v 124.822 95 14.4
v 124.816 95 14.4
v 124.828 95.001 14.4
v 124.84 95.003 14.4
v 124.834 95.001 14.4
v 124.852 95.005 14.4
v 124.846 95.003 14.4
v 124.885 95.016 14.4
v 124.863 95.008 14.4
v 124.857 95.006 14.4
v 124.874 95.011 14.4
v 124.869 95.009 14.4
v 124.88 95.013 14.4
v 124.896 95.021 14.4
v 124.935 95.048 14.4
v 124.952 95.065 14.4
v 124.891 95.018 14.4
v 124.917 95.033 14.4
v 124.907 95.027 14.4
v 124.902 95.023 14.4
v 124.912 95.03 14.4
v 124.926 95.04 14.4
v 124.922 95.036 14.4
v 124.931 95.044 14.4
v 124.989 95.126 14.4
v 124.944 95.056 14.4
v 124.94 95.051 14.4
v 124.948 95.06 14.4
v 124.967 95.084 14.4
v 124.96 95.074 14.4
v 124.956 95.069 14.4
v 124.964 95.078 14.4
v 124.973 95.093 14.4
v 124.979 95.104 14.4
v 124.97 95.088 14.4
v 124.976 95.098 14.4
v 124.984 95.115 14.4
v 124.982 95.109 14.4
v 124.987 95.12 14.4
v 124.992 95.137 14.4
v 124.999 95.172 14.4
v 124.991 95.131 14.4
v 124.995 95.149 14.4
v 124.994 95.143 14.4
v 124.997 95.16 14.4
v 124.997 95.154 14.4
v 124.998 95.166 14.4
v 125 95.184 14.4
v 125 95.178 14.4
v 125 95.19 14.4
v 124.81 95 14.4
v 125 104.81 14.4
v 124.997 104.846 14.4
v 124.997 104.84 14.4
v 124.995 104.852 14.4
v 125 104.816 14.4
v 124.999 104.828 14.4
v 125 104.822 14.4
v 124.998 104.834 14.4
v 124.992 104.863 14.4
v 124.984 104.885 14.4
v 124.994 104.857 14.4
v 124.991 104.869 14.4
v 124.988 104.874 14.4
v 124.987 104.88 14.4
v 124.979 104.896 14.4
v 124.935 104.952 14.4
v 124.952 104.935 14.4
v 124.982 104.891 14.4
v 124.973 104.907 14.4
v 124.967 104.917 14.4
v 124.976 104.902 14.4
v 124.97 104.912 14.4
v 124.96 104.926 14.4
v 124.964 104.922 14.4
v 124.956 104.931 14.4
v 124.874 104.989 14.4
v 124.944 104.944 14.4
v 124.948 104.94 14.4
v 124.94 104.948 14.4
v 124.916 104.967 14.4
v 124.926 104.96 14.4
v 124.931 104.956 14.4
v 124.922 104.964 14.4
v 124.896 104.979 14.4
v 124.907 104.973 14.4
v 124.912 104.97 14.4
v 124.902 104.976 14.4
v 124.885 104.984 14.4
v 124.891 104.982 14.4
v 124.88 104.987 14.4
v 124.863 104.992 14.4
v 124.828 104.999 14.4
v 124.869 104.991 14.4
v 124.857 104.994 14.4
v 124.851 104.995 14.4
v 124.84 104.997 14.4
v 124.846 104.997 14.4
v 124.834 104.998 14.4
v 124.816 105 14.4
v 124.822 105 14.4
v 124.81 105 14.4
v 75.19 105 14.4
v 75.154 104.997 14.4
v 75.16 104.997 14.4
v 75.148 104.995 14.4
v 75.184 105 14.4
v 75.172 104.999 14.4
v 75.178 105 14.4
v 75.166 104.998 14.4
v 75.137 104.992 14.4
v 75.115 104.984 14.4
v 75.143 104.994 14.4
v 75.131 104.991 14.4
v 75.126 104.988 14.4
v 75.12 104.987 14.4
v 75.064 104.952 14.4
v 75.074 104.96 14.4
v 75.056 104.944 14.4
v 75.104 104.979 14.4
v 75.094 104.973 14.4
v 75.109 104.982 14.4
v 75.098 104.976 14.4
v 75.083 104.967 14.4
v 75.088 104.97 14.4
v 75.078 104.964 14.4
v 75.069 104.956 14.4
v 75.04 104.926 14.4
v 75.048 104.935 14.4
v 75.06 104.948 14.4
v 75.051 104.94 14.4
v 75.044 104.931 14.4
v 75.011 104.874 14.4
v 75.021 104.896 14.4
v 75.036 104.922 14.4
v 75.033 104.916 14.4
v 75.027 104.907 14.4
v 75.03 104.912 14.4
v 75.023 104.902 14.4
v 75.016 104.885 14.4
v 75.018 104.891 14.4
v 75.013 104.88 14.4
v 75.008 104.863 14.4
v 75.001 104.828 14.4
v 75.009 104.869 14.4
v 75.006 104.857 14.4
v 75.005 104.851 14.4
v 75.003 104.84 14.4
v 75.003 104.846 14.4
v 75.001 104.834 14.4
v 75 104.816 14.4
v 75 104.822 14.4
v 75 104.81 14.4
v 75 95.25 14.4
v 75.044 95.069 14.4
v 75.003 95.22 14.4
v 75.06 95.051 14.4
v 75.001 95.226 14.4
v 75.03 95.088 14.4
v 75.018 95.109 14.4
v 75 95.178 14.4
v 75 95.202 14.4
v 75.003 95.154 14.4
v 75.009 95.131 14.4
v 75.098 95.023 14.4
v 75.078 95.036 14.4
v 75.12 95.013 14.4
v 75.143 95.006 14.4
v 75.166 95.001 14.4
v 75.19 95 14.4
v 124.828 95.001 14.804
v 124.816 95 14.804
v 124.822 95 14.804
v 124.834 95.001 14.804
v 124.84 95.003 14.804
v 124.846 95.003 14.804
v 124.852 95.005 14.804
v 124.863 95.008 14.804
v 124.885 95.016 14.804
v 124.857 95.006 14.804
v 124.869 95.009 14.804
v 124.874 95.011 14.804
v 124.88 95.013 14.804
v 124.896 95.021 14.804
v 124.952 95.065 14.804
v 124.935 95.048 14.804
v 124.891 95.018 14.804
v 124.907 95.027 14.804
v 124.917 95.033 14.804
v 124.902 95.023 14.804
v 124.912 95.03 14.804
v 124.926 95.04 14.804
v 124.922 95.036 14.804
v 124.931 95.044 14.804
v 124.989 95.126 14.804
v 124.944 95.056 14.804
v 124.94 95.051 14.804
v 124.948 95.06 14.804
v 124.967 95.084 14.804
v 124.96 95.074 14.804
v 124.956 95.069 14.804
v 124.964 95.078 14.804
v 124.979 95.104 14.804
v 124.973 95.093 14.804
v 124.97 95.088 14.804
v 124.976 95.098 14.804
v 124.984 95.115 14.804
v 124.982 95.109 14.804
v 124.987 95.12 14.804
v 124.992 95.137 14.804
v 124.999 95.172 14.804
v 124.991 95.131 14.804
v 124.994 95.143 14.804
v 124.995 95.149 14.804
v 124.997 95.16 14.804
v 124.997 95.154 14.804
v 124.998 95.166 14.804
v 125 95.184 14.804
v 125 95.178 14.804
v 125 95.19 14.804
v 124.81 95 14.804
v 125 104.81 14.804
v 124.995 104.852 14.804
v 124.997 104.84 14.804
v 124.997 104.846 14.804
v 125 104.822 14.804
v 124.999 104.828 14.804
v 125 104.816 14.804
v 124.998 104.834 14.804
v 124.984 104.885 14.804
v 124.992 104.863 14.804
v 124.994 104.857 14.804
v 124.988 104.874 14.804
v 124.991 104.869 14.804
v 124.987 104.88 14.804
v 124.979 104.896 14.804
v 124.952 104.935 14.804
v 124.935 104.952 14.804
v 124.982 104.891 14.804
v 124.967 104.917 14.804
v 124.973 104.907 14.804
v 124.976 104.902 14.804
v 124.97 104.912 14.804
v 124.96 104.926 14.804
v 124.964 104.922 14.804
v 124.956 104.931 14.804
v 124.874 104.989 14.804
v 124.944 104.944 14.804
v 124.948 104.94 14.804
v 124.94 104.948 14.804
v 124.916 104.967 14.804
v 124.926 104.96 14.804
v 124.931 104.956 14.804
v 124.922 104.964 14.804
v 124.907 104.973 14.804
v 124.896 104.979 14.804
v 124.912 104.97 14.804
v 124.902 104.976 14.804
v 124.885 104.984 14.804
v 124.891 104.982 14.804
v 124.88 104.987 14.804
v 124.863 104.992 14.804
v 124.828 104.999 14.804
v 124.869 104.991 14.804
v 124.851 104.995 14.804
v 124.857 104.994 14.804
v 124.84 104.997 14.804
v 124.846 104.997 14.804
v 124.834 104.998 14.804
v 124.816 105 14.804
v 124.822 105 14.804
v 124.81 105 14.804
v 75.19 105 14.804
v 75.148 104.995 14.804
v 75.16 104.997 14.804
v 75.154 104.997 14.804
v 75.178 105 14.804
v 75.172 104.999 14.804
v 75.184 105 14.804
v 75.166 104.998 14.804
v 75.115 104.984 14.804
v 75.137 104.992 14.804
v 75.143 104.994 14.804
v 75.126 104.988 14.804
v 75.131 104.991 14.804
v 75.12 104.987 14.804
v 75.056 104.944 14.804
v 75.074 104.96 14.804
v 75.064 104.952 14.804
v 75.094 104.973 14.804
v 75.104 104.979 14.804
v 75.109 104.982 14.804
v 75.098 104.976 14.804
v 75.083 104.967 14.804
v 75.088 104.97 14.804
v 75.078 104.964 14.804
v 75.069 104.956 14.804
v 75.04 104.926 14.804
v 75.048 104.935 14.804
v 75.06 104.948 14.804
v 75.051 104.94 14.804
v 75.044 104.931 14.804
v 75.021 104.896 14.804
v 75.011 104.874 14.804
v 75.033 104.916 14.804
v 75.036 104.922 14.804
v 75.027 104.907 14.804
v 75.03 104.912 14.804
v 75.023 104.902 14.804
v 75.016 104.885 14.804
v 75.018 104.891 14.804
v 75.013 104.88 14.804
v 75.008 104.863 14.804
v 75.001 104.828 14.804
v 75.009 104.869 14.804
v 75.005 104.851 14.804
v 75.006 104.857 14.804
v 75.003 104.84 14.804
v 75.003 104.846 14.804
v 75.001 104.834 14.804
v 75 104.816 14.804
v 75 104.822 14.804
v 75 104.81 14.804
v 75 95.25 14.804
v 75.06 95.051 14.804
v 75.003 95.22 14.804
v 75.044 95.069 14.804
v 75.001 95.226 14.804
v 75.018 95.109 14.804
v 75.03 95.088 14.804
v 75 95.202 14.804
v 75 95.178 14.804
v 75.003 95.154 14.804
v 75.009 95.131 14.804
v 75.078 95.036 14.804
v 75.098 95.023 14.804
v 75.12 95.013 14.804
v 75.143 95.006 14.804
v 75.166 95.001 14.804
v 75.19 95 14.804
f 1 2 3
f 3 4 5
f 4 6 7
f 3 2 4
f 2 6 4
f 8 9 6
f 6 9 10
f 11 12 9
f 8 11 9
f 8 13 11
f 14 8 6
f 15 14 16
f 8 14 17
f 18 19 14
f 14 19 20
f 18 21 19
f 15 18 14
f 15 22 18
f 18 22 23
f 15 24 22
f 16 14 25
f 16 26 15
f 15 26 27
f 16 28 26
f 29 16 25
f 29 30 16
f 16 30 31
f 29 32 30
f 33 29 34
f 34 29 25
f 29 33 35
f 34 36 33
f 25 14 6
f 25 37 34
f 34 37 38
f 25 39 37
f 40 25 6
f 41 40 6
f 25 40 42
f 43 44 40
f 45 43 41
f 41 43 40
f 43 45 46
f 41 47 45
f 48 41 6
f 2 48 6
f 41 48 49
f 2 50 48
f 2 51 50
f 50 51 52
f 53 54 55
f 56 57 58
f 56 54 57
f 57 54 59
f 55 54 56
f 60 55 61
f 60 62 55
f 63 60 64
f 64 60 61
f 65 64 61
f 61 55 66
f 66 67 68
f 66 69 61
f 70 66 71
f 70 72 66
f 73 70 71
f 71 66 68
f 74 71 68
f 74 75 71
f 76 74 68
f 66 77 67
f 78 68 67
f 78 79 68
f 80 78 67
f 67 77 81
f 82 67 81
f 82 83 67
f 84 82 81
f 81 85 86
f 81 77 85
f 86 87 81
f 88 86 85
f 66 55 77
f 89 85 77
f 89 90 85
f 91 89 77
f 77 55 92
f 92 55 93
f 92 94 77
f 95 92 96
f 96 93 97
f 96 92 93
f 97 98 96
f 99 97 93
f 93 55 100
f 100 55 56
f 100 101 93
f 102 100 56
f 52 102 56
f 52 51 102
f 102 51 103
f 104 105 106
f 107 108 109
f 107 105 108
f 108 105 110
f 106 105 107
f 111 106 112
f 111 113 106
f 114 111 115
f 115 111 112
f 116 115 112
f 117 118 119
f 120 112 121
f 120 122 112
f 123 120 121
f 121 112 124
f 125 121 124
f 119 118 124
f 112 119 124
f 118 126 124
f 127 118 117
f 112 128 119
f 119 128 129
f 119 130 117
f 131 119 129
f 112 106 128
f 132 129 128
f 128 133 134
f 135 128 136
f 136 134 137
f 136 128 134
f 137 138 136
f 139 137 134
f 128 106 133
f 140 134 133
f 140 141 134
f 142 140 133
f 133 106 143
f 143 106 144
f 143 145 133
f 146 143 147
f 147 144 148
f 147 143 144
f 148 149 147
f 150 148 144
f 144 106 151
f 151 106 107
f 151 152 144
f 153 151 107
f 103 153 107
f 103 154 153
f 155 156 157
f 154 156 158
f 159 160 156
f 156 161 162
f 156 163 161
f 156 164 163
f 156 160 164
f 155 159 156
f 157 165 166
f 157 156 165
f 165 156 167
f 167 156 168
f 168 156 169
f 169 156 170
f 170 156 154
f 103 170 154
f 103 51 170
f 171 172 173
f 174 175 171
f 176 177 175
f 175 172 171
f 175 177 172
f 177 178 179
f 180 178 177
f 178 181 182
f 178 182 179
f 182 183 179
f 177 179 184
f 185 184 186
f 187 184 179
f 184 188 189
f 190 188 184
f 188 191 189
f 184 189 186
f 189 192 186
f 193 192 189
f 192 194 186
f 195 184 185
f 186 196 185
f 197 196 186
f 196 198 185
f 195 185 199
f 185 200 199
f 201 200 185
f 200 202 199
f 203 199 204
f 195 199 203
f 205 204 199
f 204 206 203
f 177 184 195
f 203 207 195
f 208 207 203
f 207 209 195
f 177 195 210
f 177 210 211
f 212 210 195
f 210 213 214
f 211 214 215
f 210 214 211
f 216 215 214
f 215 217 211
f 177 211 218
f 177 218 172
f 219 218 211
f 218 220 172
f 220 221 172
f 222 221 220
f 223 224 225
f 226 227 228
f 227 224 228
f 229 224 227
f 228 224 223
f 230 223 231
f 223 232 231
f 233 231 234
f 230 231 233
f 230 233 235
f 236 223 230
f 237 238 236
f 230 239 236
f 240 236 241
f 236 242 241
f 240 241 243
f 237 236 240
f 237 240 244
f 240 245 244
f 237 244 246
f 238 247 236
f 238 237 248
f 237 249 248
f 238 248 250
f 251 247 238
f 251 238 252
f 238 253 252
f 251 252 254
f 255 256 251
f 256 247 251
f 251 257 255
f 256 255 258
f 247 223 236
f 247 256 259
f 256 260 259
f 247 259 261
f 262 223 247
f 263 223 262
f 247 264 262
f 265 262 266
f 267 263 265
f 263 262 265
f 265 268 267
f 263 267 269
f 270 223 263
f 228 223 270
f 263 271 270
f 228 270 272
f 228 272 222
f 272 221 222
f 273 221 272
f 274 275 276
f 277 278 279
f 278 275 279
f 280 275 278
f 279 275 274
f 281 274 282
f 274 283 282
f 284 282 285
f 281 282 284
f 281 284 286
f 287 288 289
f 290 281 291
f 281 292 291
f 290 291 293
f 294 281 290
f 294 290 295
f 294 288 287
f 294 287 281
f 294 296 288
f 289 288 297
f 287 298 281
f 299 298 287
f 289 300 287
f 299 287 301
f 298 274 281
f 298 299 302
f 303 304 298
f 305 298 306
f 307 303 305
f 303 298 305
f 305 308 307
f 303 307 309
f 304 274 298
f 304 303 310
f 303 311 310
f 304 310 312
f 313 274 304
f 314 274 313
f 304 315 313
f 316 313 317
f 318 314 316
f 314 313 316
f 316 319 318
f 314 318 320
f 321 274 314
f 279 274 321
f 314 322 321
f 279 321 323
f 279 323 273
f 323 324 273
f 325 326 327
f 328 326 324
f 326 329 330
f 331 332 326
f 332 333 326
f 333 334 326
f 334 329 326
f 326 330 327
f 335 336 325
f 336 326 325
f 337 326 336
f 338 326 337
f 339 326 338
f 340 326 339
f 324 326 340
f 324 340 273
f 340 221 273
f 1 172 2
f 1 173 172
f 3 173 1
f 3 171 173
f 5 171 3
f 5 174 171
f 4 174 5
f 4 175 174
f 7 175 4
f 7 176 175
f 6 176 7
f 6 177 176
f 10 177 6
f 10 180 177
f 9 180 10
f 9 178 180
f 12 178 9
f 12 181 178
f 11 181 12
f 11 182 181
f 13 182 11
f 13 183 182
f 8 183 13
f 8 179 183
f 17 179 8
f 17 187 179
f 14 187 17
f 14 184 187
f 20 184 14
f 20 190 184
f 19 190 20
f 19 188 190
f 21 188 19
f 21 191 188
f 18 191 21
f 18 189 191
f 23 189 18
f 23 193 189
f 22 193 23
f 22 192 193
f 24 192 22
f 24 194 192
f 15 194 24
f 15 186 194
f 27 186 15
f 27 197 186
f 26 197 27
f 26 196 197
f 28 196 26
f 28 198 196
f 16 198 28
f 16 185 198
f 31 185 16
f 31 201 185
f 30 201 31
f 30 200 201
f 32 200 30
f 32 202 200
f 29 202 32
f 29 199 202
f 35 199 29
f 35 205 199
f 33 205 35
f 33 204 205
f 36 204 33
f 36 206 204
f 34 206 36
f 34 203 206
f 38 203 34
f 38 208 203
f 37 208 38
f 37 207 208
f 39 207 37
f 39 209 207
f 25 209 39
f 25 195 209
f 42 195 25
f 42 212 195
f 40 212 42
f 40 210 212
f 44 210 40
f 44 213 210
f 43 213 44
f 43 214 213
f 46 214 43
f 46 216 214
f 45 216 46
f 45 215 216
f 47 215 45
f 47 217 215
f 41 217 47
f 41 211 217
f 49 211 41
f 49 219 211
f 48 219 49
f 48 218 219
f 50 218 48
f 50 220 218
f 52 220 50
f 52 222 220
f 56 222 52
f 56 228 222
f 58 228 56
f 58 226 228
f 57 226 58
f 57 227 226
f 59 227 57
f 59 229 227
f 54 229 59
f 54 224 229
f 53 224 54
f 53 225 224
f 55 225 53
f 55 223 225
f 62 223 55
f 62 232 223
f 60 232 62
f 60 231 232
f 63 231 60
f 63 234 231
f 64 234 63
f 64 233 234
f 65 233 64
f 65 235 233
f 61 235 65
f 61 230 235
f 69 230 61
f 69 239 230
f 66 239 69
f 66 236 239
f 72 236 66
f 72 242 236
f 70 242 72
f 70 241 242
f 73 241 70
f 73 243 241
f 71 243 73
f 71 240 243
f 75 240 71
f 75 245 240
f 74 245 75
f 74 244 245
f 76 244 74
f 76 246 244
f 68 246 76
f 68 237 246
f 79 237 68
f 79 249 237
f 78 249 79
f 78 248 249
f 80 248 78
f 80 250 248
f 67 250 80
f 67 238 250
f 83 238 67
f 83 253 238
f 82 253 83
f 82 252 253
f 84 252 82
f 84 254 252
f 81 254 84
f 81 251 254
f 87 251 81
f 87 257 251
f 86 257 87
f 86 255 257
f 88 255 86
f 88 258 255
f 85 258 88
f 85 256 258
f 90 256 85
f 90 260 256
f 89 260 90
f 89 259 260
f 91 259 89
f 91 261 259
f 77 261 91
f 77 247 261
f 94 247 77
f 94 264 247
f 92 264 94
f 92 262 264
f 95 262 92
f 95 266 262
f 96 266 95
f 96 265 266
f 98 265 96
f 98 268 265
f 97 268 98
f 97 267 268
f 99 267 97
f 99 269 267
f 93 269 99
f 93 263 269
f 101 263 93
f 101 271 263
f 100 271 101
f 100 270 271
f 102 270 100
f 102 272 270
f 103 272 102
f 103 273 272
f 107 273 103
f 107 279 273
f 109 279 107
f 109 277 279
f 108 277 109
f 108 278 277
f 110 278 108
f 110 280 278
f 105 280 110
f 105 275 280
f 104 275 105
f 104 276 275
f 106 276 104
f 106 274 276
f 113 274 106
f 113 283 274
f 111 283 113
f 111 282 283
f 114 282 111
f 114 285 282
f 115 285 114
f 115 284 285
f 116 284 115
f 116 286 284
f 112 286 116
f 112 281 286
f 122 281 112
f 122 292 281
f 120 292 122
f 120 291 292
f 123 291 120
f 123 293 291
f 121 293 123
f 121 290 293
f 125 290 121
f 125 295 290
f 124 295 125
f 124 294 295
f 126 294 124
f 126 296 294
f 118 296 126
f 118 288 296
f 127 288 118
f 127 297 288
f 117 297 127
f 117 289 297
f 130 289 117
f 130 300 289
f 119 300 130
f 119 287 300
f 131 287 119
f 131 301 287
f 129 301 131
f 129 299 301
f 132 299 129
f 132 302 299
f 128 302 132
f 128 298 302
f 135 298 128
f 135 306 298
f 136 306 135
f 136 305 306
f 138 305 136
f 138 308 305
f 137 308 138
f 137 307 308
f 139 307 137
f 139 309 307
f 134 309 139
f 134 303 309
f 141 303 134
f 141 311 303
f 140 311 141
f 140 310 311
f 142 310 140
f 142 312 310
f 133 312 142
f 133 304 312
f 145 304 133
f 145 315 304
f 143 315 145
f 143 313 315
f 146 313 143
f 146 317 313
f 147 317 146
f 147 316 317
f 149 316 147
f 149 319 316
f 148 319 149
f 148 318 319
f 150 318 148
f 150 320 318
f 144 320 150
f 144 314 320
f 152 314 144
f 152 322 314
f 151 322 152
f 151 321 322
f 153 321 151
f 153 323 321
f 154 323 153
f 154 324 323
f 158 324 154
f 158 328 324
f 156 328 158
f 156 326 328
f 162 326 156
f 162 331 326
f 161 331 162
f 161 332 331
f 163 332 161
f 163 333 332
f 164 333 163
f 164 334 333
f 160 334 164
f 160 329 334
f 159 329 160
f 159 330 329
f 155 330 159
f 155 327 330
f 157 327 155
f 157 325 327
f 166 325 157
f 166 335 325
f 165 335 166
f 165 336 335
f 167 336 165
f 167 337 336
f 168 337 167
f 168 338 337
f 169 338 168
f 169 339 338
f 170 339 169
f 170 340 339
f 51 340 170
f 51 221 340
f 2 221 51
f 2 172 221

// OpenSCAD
module drawBasicShape(x1, y1, x2, y2, width)
{
	length = sqrt((x1-x2)*(x1-x2) + (y1-y2)*(y1-y2));
	if (width!=0.0) {
		square(size = [width, length], center = false);
		translate([width/2.0, 0, 0]) circle(d=width);
		translate([width/2.0, length, 0]) circle(d=width);
	}
}

module translateAndRotate(x1, y1, x2, y2, width)
{
	if (width != 0.0) {
		angle = atan((y2-y1)/(x2-x1)) +270;
		if (x2>=x1) {
			translate([x1, y1, 0.0]) rotate([0.0, 0.0, angle]) translate([-width/2.0, 0.0, 0.0]) scale([1.0, 1.0, 1.0]) drawBasicShape(x1, y1, x2, y2, width);
		}
		else {
			translate([x1, y1, 0.0]) rotate([0.0, 0.0, angle+180]) translate([-width/2.0, 0.0, 0.0]) scale([1.0, 1.0, 1.0]) drawBasicShape(x1, y1, x2, y2, width);		}
	}
}

$fn=50;

points35 = [
[75.77800000, 95.77800000, 0.00000000],
[124.22200000, 95.77800000, 0.37999672],
[124.22200000, 104.22200000, 0.37997788],
[75.77800000, 104.22200000, 0.37999548],
[75.77800000, 95.83800000, 0.37998140],
[75.48400000, 95.48400000, 0.00000000],
[124.51600000, 95.48400000, 0.37999746],
[124.51600000, 104.51600000, 0.37998977],
[75.48400000, 104.51600000, 0.37999868],
[75.48400000, 95.54400000, 0.37998644],
[75.19000000, 95.19000000, 0.00000000],
[124.81000000, 95.19000000, 0.38000060],
[124.81000000, 104.81000000, 0.38000021],
[75.19000000, 104.81000000, 0.37999939],
[75.19000000, 95.25000000, 0.38000344],
[75.53600000, 95.39000000, 0.00000000],
[76.11100000, 95.94600000, 0.00000000],
[75.94600000, 96.11100000, 0.38012914],
[75.94600000, 96.52800000, 0.38087711],
[76.52800000, 95.94600000, 0.38062992],
[76.94500000, 95.94600000, 0.38087711],
[75.94600000, 96.94500000, 0.38071263],
[75.94600000, 97.36200000, 0.38073291],
[77.36200000, 95.94600000, 0.38074663],
[77.77900000, 95.94600000, 0.38073291],
[75.94600000, 97.77900000, 0.38076515],
[75.94600000, 98.19600000, 0.38073291],
[78.19600000, 95.94600000, 0.38075792],
[78.61300000, 95.94600000, 0.38087711],
[75.94600000, 98.61300000, 0.38076888],
[75.94600000, 99.03000000, 0.38073291],
[79.03000000, 95.94600000, 0.38077689],
[79.44700000, 95.94600000, 0.38073291],
[75.94600000, 99.44700000, 0.38077084],
[75.94600000, 99.86400000, 0.38087711],
[79.86400000, 95.94600000, 0.38076608],
[80.28100000, 95.94600000, 0.38087711],
[75.94600000, 100.28100000, 0.38077204],
[75.94600000, 100.69800000, 0.38087711],
[80.69800000, 95.94600000, 0.38077696],
[81.11500000, 95.94600000, 0.38087711],
[75.94600000, 101.11500000, 0.38078108],
[75.94600000, 101.53300000, 0.38002742],
[81.53300000, 95.94600000, 0.38073180],
[81.95000000, 95.94600000, 0.38073291],
[75.94600000, 101.95000000, 0.38073140],
[75.94600000, 102.36700000, 0.38087711],
[82.36700000, 95.94600000, 0.38073768],
[82.78400000, 95.94600000, 0.38073291],
[75.94600000, 102.78400000, 0.38074319],
[75.94600000, 103.20100000, 0.38073291],
[83.20100000, 95.94600000, 0.38074807],
[83.61800000, 95.94600000, 0.38073291],
[75.94600000, 103.61800000, 0.38074688],
[75.95600000, 104.02400000, 0.38122759],
[84.03500000, 95.94600000, 0.38075541],
[84.45200000, 95.94600000, 0.38073291],
[76.34400000, 104.05400000, 0.38075745],
[76.76100000, 104.05400000, 0.38073291],
[84.86900000, 95.94600000, 0.38075745],
[85.28600000, 95.94600000, 0.38073291],
[77.17800000, 104.05400000, 0.38075745],
[77.59500000, 104.05400000, 0.38073291],
[85.70300000, 95.94600000, 0.38075745],
[86.12000000, 95.94600000, 0.38073291],
[78.01200000, 104.05400000, 0.38075745],
[78.42900000, 104.05400000, 0.38073291],
[86.53700000, 95.94600000, 0.38075745],
[86.95400000, 95.94600000, 0.38073291],
[78.84600000, 104.05400000, 0.38075745],
[79.26300000, 104.05400000, 0.38073291],
[87.37100000, 95.94600000, 0.38075745],
[87.78900000, 95.94600000, 0.38002742],
[79.68000000, 104.05400000, 0.38073927],
[80.09700000, 104.05400000, 0.38073291],
[88.20600000, 95.94600000, 0.38073927],
[88.62300000, 95.94600000, 0.38073291],
[80.51400000, 104.05400000, 0.38073927],
[80.93200000, 104.05400000, 0.38002742],
[89.04000000, 95.94600000, 0.38075745],
[89.45700000, 95.94600000, 0.38073291],
[81.34900000, 104.05400000, 0.38075745],
[81.76600000, 104.05400000, 0.38073291],
[89.87400000, 95.94600000, 0.38075745],
[90.29100000, 95.94600000, 0.38073291],
[82.18300000, 104.05400000, 0.38075745],
[82.60000000, 104.05400000, 0.38073291],
[90.70800000, 95.94600000, 0.38075745],
[91.12500000, 95.94600000, 0.38073291],
[83.01700000, 104.05400000, 0.38075745],
[83.43400000, 104.05400000, 0.38073291],
[91.54200000, 95.94600000, 0.38075745],
[91.95900000, 95.94600000, 0.38073291],
[83.85100000, 104.05400000, 0.38075745],
[84.26800000, 104.05400000, 0.38073291],
[92.37600000, 95.94600000, 0.38075745],
[92.79300000, 95.94600000, 0.38073291],
[84.68500000, 104.05400000, 0.38075745],
[85.10200000, 104.05400000, 0.38073291],
[93.21000000, 95.94600000, 0.38075745],
[93.62700000, 95.94600000, 0.38073291],
[85.51900000, 104.05400000, 0.38075745],
[85.93600000, 104.05400000, 0.38073291],
[94.04400000, 95.94600000, 0.38075745],
[94.46200000, 95.94600000, 0.38002742],
[86.35300000, 104.05400000, 0.38073927],
[86.77000000, 104.05400000, 0.38073291],
[94.87900000, 95.94600000, 0.38073927],
[95.29600000, 95.94600000, 0.38073291],
[87.18800000, 104.05400000, 0.38075745],
[87.60500000, 104.05400000, 0.38073291],
[95.71300000, 95.94600000, 0.38075745],
[96.13000000, 95.94600000, 0.38073291],
[88.02200000, 104.05400000, 0.38075745],
[88.43900000, 104.05400000, 0.38073291],
[96.54700000, 95.94600000, 0.38075745],
[96.96400000, 95.94600000, 0.38073291],
[88.85600000, 104.05400000, 0.38075745],
[89.27300000, 104.05400000, 0.38073291],
[97.38100000, 95.94600000, 0.38075745],
[97.79800000, 95.94600000, 0.38073291],
[89.69000000, 104.05400000, 0.38075745],
[90.10700000, 104.05400000, 0.38073291],
[98.21500000, 95.94600000, 0.38075745],
[98.63200000, 95.94600000, 0.38073291],
[90.52400000, 104.05400000, 0.38075745],
[90.94100000, 104.05400000, 0.38073291],
[99.04900000, 95.94600000, 0.38075745],
[99.46600000, 95.94600000, 0.38073291],
[91.35800000, 104.05400000, 0.38075745],
[91.77500000, 104.05400000, 0.38073291],
[99.88300000, 95.94600000, 0.38075745],
[100.30000000, 95.94600000, 0.38073291],
[92.19200000, 104.05400000, 0.38075745],
[92.60900000, 104.05400000, 0.38073291],
[100.71800000, 95.94600000, 0.38073927],
[101.13500000, 95.94600000, 0.38073291],
[93.02600000, 104.05400000, 0.38073927],
[93.44400000, 104.05400000, 0.38002742],
[101.55200000, 95.94600000, 0.38075745],
[101.96900000, 95.94600000, 0.38073291],
[93.86100000, 104.05400000, 0.38075745],
[94.27800000, 104.05400000, 0.38073291],
[102.38600000, 95.94600000, 0.38075745],
[102.80300000, 95.94600000, 0.38073291],
[94.69500000, 104.05400000, 0.38075745],
[95.11200000, 104.05400000, 0.38073291],
[103.22000000, 95.94600000, 0.38075745],
[103.63700000, 95.94600000, 0.38073291],
[95.52900000, 104.05400000, 0.38075745],
[95.94600000, 104.05400000, 0.38073291],
[104.05400000, 95.94600000, 0.38075745],
[104.47100000, 95.94600000, 0.38073291],
[96.36300000, 104.05400000, 0.38075745],
[96.78000000, 104.05400000, 0.38073291],
[104.88800000, 95.94600000, 0.38075745],
[105.30500000, 95.94600000, 0.38073291],
[97.19700000, 104.05400000, 0.38075745],
[97.61400000, 104.05400000, 0.38073291],
[105.72200000, 95.94600000, 0.38075745],
[106.13900000, 95.94600000, 0.38073291],
[98.03100000, 104.05400000, 0.38075745],
[98.44800000, 104.05400000, 0.38073291],
[106.55600000, 95.94600000, 0.38075745],
[106.97300000, 95.94600000, 0.38073291],
[98.86500000, 104.05400000, 0.38075745],
[99.28200000, 104.05400000, 0.38073291],
[107.39100000, 95.94600000, 0.38073927],
[107.80800000, 95.94600000, 0.38073291],
[99.69900000, 104.05400000, 0.38073927],
[100.11700000, 104.05400000, 0.38017128],
[108.22500000, 95.94600000, 0.38075221],
[108.64200000, 95.94600000, 0.38087711],
[100.53400000, 104.05400000, 0.38075221],
[100.95100000, 104.05400000, 0.38087711],
[109.05900000, 95.94600000, 0.38075221],
[109.47600000, 95.94600000, 0.38087711],
[101.36800000, 104.05400000, 0.38075221],
[101.78500000, 104.05400000, 0.38087711],
[109.89300000, 95.94600000, 0.38075221],
[110.31000000, 95.94600000, 0.38087711],
[102.20200000, 104.05400000, 0.38075221],
[102.61900000, 104.05400000, 0.38087711],
[110.72700000, 95.94600000, 0.38075221],
[111.14400000, 95.94600000, 0.38087711],
[103.03600000, 104.05400000, 0.38075221],
[103.45300000, 104.05400000, 0.38087711],
[111.56100000, 95.94600000, 0.38075221],
[111.97800000, 95.94600000, 0.38087711],
[103.87000000, 104.05400000, 0.38075221],
[104.28700000, 104.05400000, 0.38087711],
[112.39500000, 95.94600000, 0.38075221],
[112.81200000, 95.94600000, 0.38087711],
[104.70400000, 104.05400000, 0.38075221],
[105.12100000, 104.05400000, 0.38087711],
[113.22900000, 95.94600000, 0.38075221],
[113.64700000, 95.94600000, 0.38017128],
[105.53800000, 104.05400000, 0.38073402],
[105.95500000, 104.05400000, 0.38087711],
[114.06400000, 95.94600000, 0.38073402],
[114.48100000, 95.94600000, 0.38087711],
[106.37300000, 104.05400000, 0.38075221],
[106.79000000, 104.05400000, 0.38087711],
[114.89800000, 95.94600000, 0.38075221],
[115.31500000, 95.94600000, 0.38087711],
[107.20700000, 104.05400000, 0.38075221],
[107.62400000, 104.05400000, 0.38087711],
[115.73200000, 95.94600000, 0.38075221],
[116.14900000, 95.94600000, 0.38087711],
[108.04100000, 104.05400000, 0.38075221],
[108.45800000, 104.05400000, 0.38087711],
[116.56600000, 95.94600000, 0.38075221],
[116.98300000, 95.94600000, 0.38087711],
[108.87500000, 104.05400000, 0.38075221],
[109.29200000, 104.05400000, 0.38087711],
[117.40000000, 95.94600000, 0.38075221],
[117.81700000, 95.94600000, 0.38087711],
[109.70900000, 104.05400000, 0.38075221],
[110.12600000, 104.05400000, 0.38087711],
[118.23400000, 95.94600000, 0.38075221],
[118.65100000, 95.94600000, 0.38087711],
[110.54300000, 104.05400000, 0.38075221],
[110.96000000, 104.05400000, 0.38087711],
[119.06800000, 95.94600000, 0.38075221],
[119.48500000, 95.94600000, 0.38087711],
[111.37700000, 104.05400000, 0.38075221],
[111.79400000, 104.05400000, 0.38087711],
[119.90300000, 95.94600000, 0.38073402],
[120.32000000, 95.94600000, 0.38087711],
[112.21100000, 104.05400000, 0.38073402],
[112.62900000, 104.05400000, 0.38017128],
[120.73700000, 95.94600000, 0.38075221],
[121.15400000, 95.94600000, 0.38087711],
[113.04600000, 104.05400000, 0.38075221],
[113.46300000, 104.05400000, 0.38087711],
[121.57100000, 95.94600000, 0.38075221],
[121.98800000, 95.94600000, 0.38087711],
[113.88000000, 104.05400000, 0.38075221],
[114.29700000, 104.05400000, 0.38087711],
[122.40500000, 95.94600000, 0.38075221],
[122.82200000, 95.94600000, 0.38087711],
[114.71400000, 104.05400000, 0.38075221],
[115.13100000, 104.05400000, 0.38087711],
[123.23900000, 95.94600000, 0.38075221],
[123.65600000, 95.94600000, 0.38087711],
[115.54800000, 104.05400000, 0.38075221],
[115.96500000, 104.05400000, 0.38087711],
[124.04400000, 95.97500000, 0.38073716],
[124.05400000, 96.38200000, 0.38035456],
[116.38200000, 104.05400000, 0.38075242],
[116.79900000, 104.05400000, 0.38073291],
[124.05400000, 96.79900000, 0.38074807],
[124.05400000, 97.21600000, 0.38073291],
[117.21600000, 104.05400000, 0.38074319],
[117.63300000, 104.05400000, 0.38087711],
[124.05400000, 97.63300000, 0.38073768],
[124.05400000, 98.05000000, 0.38087711],
[118.05000000, 104.05400000, 0.38073140],
[118.46700000, 104.05400000, 0.38087711],
[124.05400000, 98.46700000, 0.38073180],
[124.05400000, 98.88400000, 0.38073291],
[118.88400000, 104.05400000, 0.38072403],
[119.30200000, 104.05400000, 0.38017128],
[124.05400000, 99.30200000, 0.38078590],
[124.05400000, 99.71900000, 0.38073291],
[119.71900000, 104.05400000, 0.38078185],
[120.13600000, 104.05400000, 0.38073291],
[124.05400000, 100.13600000, 0.38078778],
[124.05400000, 100.55300000, 0.38073291],
[120.55300000, 104.05400000, 0.38078298],
[120.97000000, 104.05400000, 0.38073291],
[124.05400000, 100.97000000, 0.38077689],
[124.05400000, 101.38700000, 0.38073291],
[121.38700000, 104.05400000, 0.38076888],
[121.80400000, 104.05400000, 0.38087711],
[124.05400000, 101.80400000, 0.38075792],
[124.05400000, 102.22100000, 0.38087711],
[122.22100000, 104.05400000, 0.38076515],
[122.63800000, 104.05400000, 0.38073291],
[124.05400000, 102.63800000, 0.38074663],
[124.05400000, 103.05500000, 0.38087711],
[123.05500000, 104.05400000, 0.38071263],
[123.47200000, 104.05400000, 0.38073291],
[124.05400000, 103.47200000, 0.38070298],
[124.05400000, 103.88900000, 0.38087711],
[123.88900000, 104.05400000, 0.38038683],
];

translate([0.0, 0.0, 14.40000000]) {
	linear_extrude(height = 0.40400000, center = false, convexity = 10, twist = 0) {
		union() {
			for( i=[0:len(points35)-2] ){ 
				x1 = points35[i][0];
				y1 = points35[i][1];
				x2 = points35[i+1][0];
				y2 = points35[i+1][1];
				width = points35[i+1][2];
				translateAndRotate(x1, y1, x2, y2, width);
			}
		}
	}
}
